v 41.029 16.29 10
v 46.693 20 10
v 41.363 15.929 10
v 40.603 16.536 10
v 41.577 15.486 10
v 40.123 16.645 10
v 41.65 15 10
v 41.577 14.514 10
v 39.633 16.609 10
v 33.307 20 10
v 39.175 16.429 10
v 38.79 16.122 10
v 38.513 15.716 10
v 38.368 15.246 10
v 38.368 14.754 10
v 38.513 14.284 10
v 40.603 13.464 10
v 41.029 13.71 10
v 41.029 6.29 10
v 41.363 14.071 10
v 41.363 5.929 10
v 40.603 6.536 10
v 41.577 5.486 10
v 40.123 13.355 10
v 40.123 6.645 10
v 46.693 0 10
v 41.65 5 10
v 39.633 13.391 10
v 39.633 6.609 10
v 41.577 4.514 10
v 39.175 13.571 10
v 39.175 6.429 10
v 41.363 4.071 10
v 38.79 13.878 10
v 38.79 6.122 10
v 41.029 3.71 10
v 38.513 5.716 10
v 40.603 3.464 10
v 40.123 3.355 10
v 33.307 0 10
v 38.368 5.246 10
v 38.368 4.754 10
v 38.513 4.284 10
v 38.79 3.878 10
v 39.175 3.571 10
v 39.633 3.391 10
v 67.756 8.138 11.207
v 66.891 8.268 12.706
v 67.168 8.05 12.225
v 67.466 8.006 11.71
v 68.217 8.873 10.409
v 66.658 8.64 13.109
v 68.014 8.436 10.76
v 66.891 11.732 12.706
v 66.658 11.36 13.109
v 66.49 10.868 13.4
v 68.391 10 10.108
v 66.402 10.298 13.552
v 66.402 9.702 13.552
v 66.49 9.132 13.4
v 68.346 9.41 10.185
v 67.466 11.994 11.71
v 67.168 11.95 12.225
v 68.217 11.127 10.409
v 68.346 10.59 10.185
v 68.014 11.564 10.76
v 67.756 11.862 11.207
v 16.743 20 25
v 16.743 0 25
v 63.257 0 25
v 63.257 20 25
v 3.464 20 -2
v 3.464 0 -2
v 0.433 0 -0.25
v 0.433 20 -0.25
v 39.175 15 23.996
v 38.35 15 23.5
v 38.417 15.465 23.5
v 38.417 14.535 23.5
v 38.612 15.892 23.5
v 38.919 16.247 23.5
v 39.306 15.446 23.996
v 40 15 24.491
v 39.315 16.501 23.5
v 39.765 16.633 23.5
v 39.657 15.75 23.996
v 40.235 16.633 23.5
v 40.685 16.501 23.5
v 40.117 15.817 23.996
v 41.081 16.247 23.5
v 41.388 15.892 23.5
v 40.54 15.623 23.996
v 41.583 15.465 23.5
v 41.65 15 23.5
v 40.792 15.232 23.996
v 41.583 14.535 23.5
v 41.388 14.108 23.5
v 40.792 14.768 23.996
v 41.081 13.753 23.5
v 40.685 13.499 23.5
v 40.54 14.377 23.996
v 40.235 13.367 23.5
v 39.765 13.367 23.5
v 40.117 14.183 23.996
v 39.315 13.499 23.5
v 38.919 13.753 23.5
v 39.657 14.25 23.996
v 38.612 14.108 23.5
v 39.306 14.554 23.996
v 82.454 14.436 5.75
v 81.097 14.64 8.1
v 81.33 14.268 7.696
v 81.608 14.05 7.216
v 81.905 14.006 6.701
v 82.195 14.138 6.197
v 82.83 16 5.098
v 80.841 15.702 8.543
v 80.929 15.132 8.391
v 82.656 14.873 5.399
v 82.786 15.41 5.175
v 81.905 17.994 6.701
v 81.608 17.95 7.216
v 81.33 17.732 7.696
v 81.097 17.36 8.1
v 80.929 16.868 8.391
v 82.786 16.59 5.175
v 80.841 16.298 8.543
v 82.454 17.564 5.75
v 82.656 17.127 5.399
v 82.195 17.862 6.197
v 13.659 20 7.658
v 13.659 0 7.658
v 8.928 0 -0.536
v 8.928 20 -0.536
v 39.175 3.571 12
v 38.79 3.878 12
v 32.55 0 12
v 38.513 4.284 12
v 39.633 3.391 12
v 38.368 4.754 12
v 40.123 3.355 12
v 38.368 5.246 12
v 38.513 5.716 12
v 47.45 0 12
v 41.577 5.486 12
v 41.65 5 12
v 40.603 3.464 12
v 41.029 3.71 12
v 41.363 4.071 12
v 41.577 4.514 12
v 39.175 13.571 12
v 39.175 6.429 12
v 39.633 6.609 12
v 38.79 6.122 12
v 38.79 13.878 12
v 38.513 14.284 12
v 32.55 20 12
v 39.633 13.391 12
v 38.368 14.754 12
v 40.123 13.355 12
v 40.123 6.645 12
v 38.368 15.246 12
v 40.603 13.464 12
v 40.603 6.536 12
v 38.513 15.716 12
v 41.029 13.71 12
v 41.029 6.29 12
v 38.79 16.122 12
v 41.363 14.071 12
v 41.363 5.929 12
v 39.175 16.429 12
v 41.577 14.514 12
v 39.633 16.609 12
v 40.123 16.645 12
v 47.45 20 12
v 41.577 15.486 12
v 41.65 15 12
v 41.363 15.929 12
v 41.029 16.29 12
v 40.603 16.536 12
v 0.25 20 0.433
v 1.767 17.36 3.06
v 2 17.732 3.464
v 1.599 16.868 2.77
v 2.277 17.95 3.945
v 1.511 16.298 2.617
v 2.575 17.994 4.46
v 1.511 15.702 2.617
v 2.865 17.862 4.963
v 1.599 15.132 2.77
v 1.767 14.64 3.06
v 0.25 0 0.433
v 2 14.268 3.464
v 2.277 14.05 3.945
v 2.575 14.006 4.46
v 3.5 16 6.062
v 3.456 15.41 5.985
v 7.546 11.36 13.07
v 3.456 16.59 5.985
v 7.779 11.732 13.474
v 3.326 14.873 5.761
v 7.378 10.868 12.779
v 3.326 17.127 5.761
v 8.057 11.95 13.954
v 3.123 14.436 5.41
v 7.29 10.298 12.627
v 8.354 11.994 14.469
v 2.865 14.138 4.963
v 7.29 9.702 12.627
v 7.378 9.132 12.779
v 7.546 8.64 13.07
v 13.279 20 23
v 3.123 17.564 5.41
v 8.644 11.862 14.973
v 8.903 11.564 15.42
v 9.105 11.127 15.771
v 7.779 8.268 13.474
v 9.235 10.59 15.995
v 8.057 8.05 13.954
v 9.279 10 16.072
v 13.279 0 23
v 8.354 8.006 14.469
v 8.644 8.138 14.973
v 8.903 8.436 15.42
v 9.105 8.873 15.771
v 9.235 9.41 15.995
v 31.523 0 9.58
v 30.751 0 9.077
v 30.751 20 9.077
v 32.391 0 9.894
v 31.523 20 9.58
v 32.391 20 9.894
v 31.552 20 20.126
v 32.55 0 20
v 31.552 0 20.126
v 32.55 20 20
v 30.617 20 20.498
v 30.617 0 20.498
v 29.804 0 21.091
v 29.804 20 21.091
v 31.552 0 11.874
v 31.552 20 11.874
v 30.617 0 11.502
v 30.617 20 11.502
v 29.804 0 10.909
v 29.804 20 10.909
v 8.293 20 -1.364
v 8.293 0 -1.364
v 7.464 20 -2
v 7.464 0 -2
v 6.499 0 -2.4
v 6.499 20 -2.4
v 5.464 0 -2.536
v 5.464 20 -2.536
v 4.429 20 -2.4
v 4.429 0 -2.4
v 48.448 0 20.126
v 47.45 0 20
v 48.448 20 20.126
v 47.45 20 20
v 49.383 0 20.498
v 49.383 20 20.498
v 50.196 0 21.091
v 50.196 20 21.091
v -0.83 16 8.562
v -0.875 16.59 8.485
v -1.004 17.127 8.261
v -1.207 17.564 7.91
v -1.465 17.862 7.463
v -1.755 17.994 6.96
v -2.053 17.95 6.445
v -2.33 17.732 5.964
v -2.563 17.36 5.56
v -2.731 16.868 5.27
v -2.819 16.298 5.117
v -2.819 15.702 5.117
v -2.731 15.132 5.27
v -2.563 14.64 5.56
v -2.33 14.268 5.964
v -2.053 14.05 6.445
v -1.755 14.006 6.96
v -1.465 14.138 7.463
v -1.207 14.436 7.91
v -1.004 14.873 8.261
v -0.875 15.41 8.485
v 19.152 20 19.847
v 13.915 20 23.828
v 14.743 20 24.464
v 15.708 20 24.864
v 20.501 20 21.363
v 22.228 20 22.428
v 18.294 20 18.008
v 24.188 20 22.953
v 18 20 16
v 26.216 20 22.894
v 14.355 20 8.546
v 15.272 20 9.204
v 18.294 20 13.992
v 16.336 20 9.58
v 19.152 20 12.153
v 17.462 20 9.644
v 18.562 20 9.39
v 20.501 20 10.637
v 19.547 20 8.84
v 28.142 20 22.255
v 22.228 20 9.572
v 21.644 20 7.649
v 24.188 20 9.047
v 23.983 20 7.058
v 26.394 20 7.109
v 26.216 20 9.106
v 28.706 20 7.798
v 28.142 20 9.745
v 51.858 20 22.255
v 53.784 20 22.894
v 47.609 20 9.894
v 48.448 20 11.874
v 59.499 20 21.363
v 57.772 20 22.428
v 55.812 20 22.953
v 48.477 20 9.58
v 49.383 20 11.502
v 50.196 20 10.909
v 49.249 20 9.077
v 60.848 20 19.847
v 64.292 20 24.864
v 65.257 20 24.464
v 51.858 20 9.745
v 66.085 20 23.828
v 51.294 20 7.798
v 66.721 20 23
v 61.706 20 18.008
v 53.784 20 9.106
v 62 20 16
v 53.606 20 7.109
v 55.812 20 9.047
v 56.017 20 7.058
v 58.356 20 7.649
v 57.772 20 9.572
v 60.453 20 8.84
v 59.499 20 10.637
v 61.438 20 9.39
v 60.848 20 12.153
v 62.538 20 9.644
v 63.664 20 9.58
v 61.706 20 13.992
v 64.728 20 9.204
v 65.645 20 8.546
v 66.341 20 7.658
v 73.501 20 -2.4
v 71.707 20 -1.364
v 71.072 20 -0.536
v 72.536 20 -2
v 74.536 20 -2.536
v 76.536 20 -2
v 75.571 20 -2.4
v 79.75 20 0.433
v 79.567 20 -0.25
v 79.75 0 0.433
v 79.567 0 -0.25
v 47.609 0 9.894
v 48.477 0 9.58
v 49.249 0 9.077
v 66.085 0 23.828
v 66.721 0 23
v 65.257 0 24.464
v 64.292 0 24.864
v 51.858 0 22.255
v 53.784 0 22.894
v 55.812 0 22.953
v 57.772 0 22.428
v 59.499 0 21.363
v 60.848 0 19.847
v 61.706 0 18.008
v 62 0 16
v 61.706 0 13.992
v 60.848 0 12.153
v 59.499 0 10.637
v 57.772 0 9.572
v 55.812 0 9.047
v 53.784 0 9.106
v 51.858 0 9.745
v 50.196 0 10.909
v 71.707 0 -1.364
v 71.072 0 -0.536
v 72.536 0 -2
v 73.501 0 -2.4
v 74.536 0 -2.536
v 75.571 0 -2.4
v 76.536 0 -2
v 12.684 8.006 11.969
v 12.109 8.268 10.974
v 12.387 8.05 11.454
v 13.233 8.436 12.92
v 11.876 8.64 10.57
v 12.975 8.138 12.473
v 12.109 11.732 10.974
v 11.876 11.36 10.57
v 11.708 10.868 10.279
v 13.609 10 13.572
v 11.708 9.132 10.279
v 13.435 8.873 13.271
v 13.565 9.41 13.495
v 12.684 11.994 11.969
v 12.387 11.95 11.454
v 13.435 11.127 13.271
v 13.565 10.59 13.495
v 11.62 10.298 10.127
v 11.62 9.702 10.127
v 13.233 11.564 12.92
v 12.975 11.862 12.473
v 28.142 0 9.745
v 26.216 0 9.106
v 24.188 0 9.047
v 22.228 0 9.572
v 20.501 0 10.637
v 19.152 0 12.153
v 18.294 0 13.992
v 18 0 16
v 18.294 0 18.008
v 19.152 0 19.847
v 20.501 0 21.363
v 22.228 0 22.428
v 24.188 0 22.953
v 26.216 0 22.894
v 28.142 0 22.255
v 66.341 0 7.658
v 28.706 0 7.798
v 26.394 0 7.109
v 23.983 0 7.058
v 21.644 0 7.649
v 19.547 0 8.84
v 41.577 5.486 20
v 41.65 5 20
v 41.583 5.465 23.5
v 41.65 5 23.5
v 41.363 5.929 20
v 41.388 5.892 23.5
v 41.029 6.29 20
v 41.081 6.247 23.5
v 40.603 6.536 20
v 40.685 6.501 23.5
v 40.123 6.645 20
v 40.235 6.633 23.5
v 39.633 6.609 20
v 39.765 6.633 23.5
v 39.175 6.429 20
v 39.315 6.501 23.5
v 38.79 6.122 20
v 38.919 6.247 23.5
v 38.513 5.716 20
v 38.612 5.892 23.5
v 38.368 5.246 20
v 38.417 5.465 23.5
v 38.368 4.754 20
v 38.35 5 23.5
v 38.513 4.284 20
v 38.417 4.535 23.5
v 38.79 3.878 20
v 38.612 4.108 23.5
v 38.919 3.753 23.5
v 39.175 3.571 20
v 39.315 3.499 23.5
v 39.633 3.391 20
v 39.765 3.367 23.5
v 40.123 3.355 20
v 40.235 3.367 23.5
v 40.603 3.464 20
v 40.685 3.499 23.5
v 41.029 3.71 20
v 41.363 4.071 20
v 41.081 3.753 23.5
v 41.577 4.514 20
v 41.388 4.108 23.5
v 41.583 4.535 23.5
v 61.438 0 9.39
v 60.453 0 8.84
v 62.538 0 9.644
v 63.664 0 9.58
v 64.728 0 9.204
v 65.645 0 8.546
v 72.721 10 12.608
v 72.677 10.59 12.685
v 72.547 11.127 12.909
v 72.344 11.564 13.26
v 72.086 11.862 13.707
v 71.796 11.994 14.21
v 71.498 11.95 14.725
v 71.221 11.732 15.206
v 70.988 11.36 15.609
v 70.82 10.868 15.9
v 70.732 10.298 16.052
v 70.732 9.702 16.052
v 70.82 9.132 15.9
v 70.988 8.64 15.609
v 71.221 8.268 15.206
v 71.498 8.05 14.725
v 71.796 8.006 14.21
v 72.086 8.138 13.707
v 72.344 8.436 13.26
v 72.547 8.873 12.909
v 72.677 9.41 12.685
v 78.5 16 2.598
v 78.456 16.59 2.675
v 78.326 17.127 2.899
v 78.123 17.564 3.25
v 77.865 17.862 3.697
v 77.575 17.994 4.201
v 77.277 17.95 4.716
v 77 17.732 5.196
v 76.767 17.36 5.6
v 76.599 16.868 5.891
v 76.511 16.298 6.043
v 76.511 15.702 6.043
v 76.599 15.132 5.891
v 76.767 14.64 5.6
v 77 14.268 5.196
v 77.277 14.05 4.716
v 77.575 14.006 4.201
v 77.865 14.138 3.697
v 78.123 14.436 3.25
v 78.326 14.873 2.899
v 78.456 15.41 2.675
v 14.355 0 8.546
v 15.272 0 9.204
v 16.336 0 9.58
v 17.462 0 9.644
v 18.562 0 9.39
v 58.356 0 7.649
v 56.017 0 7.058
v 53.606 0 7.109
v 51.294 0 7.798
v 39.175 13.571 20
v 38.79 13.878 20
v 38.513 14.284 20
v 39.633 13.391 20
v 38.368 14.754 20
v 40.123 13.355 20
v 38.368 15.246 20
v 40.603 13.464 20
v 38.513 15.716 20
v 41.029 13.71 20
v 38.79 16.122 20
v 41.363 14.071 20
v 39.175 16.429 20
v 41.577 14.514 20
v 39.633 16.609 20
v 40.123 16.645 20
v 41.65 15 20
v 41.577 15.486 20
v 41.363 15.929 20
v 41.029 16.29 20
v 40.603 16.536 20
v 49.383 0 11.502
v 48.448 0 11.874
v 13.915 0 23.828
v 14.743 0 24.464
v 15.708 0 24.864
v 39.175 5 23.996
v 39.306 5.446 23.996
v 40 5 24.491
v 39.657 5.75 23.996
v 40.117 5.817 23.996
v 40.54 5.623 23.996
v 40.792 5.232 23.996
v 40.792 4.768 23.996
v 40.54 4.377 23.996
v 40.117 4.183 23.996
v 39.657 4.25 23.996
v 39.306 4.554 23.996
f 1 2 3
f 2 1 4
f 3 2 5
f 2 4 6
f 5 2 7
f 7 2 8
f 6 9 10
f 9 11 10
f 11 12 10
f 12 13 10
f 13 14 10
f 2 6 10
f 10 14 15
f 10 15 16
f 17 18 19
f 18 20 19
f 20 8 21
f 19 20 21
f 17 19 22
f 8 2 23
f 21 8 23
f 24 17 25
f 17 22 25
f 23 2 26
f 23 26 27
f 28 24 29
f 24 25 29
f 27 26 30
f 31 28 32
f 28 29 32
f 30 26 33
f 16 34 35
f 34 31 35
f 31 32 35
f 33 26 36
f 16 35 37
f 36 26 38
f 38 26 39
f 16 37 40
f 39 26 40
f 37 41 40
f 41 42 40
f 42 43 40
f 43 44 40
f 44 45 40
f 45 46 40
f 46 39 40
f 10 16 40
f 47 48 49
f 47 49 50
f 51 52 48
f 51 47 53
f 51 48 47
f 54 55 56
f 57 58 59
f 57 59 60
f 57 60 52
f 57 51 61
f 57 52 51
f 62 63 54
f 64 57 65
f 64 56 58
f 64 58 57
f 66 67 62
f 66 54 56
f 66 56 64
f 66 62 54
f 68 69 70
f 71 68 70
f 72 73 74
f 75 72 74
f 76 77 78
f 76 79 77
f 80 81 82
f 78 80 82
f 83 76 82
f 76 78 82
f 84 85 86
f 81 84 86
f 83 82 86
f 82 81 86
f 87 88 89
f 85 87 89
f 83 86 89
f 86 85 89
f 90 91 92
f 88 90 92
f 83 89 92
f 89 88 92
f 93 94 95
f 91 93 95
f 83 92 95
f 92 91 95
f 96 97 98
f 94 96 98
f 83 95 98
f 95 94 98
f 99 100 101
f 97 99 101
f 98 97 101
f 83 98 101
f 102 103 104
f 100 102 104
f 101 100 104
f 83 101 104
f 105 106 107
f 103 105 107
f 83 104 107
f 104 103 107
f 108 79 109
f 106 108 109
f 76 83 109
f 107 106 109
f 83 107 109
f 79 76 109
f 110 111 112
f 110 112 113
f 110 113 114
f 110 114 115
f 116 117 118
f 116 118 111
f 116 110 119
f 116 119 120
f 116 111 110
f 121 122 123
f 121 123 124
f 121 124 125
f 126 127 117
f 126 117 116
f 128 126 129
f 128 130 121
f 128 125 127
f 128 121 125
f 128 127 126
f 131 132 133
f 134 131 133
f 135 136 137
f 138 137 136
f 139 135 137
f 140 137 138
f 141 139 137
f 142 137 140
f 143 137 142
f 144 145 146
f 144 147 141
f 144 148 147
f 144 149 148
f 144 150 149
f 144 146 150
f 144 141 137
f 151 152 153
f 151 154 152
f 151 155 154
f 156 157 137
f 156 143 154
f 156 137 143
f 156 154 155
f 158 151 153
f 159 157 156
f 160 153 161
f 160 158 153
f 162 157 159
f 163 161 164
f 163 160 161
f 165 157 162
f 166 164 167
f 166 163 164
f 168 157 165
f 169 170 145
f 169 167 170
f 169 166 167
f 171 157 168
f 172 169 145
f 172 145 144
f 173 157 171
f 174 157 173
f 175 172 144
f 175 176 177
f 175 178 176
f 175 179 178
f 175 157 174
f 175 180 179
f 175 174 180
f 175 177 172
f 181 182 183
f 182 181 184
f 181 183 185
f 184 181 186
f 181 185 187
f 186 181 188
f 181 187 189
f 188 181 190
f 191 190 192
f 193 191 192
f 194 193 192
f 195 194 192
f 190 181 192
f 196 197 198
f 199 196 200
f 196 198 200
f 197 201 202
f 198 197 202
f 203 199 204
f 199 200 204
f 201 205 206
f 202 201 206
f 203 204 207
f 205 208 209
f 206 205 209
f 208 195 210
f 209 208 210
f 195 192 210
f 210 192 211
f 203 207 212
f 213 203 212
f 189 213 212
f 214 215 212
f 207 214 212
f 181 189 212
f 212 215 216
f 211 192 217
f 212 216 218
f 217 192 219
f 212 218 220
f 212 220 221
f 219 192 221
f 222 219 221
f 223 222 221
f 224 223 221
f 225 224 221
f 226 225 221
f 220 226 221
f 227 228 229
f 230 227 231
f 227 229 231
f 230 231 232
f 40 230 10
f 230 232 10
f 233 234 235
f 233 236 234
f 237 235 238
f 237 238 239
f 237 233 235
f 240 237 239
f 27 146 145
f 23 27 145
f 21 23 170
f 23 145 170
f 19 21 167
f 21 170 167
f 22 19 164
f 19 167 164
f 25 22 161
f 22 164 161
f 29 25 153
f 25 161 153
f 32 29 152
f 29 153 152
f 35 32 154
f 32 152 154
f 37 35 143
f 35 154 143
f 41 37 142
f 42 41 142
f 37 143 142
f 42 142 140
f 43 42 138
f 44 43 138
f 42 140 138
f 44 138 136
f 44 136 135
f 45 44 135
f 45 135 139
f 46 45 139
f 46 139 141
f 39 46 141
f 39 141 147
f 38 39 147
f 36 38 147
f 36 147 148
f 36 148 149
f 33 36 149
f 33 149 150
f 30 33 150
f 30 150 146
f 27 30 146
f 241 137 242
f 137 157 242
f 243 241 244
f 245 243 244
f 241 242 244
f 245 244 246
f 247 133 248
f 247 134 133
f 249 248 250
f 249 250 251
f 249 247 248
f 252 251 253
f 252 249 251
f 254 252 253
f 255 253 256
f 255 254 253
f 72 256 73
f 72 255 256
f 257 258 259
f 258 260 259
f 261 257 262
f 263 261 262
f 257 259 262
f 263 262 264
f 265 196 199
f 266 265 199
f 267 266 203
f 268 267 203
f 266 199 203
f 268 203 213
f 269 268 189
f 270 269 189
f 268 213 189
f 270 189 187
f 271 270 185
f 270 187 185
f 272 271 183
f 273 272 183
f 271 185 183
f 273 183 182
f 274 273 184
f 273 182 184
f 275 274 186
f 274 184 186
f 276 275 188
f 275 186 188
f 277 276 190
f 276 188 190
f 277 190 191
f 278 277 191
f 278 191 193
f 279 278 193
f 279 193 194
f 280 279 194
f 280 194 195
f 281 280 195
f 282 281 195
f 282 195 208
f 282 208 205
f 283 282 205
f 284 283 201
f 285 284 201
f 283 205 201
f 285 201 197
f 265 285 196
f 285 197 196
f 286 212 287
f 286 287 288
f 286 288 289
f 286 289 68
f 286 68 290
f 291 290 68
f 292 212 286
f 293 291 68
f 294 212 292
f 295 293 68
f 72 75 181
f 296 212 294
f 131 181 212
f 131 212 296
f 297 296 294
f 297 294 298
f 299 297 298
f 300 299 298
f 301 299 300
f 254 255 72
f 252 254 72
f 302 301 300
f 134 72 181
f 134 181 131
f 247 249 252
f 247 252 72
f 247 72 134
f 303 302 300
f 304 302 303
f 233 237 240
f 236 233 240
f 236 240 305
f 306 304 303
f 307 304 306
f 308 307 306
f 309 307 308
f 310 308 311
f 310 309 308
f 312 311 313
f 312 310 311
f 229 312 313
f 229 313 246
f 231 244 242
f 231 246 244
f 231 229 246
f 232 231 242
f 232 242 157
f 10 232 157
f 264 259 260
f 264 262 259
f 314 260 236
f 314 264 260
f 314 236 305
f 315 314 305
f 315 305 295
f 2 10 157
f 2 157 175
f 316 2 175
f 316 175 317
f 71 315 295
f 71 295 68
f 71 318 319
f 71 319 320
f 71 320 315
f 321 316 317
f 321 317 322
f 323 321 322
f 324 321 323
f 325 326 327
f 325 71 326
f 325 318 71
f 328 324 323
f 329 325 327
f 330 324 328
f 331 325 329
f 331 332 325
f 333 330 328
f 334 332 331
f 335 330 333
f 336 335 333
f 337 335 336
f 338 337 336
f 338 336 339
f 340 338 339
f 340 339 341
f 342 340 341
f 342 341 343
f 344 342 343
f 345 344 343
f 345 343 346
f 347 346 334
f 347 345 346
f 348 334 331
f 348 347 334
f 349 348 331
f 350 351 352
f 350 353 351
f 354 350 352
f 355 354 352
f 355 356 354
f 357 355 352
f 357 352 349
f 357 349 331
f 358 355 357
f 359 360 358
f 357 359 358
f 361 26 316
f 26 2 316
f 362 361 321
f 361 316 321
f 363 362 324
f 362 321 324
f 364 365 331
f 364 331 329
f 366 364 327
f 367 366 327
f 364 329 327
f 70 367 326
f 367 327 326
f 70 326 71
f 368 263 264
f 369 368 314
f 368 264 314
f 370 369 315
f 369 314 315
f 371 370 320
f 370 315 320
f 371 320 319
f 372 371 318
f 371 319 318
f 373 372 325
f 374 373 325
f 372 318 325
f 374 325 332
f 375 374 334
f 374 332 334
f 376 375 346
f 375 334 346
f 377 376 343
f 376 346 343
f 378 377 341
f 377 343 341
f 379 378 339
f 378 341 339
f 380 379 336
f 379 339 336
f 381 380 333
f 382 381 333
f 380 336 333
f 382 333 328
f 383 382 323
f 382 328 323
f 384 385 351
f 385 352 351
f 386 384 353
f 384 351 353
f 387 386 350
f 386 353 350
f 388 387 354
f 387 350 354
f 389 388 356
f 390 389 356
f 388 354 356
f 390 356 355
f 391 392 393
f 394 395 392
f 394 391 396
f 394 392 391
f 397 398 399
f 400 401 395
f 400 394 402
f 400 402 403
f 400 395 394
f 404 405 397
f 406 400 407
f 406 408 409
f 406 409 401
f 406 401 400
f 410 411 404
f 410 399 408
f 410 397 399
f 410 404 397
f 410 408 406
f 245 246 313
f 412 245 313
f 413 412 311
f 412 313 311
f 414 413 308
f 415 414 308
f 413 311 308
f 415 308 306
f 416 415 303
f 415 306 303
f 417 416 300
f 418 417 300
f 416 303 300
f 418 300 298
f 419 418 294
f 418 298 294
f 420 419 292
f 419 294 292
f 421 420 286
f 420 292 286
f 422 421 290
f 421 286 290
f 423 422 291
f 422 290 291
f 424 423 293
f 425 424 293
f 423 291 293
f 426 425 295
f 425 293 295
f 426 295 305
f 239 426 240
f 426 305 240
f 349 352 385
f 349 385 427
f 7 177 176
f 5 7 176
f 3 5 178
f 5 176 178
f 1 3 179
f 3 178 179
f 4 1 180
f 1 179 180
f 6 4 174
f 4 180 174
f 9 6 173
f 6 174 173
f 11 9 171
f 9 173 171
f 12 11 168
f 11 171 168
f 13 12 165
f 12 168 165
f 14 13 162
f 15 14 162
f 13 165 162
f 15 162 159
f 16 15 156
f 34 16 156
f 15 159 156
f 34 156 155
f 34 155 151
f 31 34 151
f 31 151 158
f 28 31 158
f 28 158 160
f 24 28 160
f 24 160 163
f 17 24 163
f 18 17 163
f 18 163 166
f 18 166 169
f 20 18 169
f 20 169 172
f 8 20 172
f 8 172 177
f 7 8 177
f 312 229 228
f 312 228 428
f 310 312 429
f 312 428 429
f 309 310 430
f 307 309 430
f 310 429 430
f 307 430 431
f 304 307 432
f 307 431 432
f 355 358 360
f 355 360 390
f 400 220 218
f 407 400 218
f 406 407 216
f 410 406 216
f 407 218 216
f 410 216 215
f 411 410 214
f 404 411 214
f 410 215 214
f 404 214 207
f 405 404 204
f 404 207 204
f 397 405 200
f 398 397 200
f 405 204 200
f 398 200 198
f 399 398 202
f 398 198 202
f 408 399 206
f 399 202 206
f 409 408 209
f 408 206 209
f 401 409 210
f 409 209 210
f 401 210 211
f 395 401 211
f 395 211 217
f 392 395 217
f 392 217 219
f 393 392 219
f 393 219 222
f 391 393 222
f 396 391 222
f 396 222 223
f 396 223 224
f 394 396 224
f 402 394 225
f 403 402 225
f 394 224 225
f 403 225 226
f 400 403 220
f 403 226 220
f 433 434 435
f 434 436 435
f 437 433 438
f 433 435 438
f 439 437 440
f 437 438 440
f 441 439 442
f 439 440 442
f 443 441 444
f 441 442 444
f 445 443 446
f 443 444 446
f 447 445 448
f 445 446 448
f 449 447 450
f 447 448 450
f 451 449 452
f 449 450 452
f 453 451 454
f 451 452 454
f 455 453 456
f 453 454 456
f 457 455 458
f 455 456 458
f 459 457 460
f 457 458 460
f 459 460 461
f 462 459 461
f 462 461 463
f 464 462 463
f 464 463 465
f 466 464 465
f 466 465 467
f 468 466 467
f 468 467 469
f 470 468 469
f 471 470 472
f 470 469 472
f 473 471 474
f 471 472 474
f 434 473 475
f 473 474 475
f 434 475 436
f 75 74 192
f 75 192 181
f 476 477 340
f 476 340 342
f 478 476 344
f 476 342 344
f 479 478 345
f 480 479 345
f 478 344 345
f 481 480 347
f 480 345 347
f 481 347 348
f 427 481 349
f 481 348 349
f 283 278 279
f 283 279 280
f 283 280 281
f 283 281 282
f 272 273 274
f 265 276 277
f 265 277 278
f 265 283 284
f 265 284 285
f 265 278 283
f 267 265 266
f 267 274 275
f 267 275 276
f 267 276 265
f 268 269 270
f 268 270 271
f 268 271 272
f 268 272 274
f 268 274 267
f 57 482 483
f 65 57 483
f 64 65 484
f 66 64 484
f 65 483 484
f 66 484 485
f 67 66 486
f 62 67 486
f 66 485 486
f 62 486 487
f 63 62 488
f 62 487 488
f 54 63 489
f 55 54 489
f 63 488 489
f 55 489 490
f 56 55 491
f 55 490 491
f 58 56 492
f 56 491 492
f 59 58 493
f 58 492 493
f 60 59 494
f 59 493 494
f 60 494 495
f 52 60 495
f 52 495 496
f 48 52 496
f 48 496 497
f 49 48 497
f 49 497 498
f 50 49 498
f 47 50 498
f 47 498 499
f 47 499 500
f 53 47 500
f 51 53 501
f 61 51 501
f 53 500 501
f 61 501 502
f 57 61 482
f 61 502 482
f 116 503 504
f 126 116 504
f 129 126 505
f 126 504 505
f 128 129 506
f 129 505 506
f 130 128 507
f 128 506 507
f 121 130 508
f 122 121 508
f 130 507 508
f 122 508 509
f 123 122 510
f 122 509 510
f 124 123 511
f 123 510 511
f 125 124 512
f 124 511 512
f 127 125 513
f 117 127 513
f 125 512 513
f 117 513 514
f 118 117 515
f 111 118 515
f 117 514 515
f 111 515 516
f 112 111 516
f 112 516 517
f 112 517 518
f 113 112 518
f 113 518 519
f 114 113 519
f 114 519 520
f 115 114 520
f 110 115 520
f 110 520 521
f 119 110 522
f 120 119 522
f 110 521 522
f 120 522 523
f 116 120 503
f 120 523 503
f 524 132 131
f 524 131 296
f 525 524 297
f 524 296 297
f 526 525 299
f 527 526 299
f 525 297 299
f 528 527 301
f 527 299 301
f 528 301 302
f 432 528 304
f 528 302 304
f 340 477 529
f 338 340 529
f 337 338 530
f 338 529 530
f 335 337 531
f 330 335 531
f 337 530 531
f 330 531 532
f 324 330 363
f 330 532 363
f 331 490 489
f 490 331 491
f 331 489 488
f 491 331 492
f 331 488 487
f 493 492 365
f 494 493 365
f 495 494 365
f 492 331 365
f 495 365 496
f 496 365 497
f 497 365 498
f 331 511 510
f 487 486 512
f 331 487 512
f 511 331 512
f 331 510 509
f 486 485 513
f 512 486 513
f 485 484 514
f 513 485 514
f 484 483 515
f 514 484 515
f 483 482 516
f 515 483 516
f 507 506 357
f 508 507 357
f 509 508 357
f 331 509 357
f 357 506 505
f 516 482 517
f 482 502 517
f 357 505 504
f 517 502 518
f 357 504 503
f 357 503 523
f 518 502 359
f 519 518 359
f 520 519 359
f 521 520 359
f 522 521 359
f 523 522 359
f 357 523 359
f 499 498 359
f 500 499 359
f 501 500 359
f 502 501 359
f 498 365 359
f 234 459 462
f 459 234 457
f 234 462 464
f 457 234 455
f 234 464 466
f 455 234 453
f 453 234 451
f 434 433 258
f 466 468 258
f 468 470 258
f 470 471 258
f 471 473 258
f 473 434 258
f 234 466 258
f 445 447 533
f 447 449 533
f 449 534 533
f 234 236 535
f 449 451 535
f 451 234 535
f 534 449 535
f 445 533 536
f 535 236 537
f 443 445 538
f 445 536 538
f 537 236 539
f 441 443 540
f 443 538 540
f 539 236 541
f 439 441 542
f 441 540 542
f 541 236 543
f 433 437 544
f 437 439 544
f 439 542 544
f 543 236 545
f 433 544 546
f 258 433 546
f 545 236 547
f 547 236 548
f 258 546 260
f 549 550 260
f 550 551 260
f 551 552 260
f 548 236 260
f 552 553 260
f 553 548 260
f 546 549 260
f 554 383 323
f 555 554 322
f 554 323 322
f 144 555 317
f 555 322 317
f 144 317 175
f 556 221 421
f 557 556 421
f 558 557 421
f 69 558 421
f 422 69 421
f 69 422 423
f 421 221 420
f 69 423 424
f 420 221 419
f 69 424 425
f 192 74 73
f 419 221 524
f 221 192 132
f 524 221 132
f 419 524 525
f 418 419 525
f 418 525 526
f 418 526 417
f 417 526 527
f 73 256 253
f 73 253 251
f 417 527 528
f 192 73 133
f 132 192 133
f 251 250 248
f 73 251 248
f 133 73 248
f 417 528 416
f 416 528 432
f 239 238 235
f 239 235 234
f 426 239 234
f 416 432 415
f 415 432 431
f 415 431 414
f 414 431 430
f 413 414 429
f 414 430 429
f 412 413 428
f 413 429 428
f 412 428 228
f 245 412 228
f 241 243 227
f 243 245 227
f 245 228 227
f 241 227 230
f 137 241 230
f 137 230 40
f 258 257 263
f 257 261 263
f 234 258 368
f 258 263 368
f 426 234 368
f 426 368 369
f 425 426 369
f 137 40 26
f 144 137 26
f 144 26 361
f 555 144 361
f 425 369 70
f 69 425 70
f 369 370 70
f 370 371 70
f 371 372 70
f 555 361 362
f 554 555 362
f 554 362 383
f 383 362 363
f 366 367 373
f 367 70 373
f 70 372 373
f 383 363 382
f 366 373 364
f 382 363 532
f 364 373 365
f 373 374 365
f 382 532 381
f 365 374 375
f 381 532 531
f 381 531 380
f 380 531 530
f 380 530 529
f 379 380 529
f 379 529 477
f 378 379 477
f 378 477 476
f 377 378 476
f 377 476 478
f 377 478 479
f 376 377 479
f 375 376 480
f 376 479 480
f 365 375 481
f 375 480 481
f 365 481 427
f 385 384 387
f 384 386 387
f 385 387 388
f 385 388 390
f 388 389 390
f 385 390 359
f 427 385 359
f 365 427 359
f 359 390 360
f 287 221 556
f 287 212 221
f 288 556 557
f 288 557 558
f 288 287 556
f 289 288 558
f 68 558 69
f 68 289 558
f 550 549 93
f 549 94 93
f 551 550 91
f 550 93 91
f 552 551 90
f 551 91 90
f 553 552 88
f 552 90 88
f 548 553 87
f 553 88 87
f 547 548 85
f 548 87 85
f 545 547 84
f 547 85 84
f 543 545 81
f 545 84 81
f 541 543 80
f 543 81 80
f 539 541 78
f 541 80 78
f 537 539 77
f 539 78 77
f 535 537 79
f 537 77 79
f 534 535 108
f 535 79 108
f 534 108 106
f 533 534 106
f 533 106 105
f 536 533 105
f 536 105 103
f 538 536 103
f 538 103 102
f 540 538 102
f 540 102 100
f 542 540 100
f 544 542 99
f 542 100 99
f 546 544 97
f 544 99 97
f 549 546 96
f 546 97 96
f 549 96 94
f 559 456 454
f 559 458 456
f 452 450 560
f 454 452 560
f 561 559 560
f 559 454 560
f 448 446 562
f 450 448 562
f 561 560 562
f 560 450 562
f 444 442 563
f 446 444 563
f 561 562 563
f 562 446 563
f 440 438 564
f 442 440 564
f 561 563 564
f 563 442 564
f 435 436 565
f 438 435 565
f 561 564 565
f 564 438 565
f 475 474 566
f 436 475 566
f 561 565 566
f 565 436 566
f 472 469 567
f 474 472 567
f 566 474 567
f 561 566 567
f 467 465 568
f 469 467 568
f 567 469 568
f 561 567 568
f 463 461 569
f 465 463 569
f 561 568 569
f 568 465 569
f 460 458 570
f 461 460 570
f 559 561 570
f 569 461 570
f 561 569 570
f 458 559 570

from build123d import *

# Parameters (mm, degrees)
EXTRUDE_1_DEPTH     = 20
SKETCH_2_R          = 7
CUT_EXTRUDE_1_DEPTH = 21
SKETCH_3_W          = 30
SKETCH_3_H          = 8
CUT_EXTRUDE_2_DEPTH = 21
FILLET_1_R          = 4
CHAMFER_1_SIZE      = 0.5
M4X0_71_D           = 3.3
M4X0_71_DEPTH       = 13.5
M4X0_71_TIP         = 0.991420021
SKETCH_6_R          = 2
CUT_EXTRUDE_3_DEPTH = 5
SKETCH_7_R          = 2
CUT_EXTRUDE_4_DEPTH = 5
SKETCH_8_R          = 2
EXTRUDE_2_DEPTH     = 5
SKETCH_9_R          = 2
EXTRUDE_3_DEPTH     = 5


with BuildPart() as part:
    # Эскиз1 → Бобышка-Вытянуть1 (new body)
    with BuildSketch(Plane(origin=(0, 0, 0), x_dir=(1, 0, 0), z_dir=(0, 1, 0))):
        with BuildLine():
            Line((0, 0), (14.43375673, -25))
            Line((14.43375673, -25), (65.56624327, -25))
            Line((65.56624327, -25), (80, 0))
            Line((80, 0), (73.07179677, 4))
            Line((73.07179677, 4), (63.396104176, -12.758791171))
            ThreePointArc((63.396104176, -12.758791171), (56.617091212, -7.146468727), (48.291796068, -10))
            Line((48.291796068, -10), (31.708203932, -10))
            ThreePointArc((31.708203932, -10), (23.382908788, -7.146468727), (16.603895824, -12.758791171))
            Line((16.603895824, -12.758791171), (6.92820323, 4))
            Line((6.92820323, 4), (0, 0))
        make_face()
    extrude(amount=EXTRUDE_1_DEPTH)

    # Эскиз2 → Вырез-Вытянуть1 (cut, through all)
    with BuildSketch(Plane(origin=(0, 20, 0), x_dir=(1, 0, 0), z_dir=(0, 1, 0))):
        with Locations((25, -16)):
            Circle(SKETCH_2_R)
        with Locations((55, -16)):
            Circle(SKETCH_2_R)
    extrude(amount=-CUT_EXTRUDE_1_DEPTH, mode=Mode.SUBTRACT)

    # Эскиз3 → Вырез-Вытянуть2 (cut, through all)
    with BuildSketch(Plane(origin=(0, 20, 0), x_dir=(1, 0, 0), z_dir=(0, 1, 0))):
        with Locations((40, -16)):
            Rectangle(SKETCH_3_W, SKETCH_3_H)
    extrude(amount=-CUT_EXTRUDE_2_DEPTH, mode=Mode.SUBTRACT)

    # Скругление1
    fillet_1_edges = [part.edges().sort_by_distance(p)[0] for p in [
        (6.92820323, 10, -4),
        (16.603895824, 10, 12.758791171),
        (31.708203932, 10, 10),
        (48.291796068, 10, 10),
        (63.396104176, 10, 12.758791171),
        (73.07179677, 10, -4),
        (65.56624327, 10, 25),
        (14.43375673, 10, 25),
        (49.255437353, 10, 12),
        (49.255437353, 10, 20),
        (30.744562647, 10, 20),
        (30.744562647, 10, 12),
    ]]
    fillet(fillet_1_edges, radius=FILLET_1_R)

    # Фаска1
    chamfer_1_edges = [part.edges().sort_by_distance(p)[0] for p in [
        (80, 10, 0),
        (0, 10, 0),
    ]]
    chamfer(chamfer_1_edges, length=CHAMFER_1_SIZE)

    # Отверстие обработанное метчиком M4x0.71
    with Locations(Plane(origin=(40, 5, 10), x_dir=(-1, 0, 0), z_dir=(0, 0, -1))):
        with Locations((0, 0), (0, 10)):
            Hole(M4X0_71_D / 2, depth=M4X0_71_DEPTH)
            with Locations((0, 0, -(M4X0_71_DEPTH + M4X0_71_TIP / 2))):  # 118° drill point
                Cone(0, M4X0_71_D / 2, M4X0_71_TIP, mode=Mode.SUBTRACT)

    # Эскиз6 → Вырез-Вытянуть3 (cut)
    with BuildSketch(Plane(origin=(60, 0, 34.641016151), x_dir=(0.5, 0, -0.866025404), z_dir=(0.866025404, 0, 0.5))):
        with Locations((23.441887617, 10)):
            Circle(SKETCH_6_R)
    extrude(amount=-CUT_EXTRUDE_3_DEPTH, mode=Mode.SUBTRACT)

    # Эскиз7 → Вырез-Вытянуть4 (cut)
    with BuildSketch(Plane(origin=(0, 0, 0), x_dir=(0.5, 0, 0.866025404), z_dir=(-0.866025404, 0, 0.5))):
        with Locations((16.558112383, 10)):
            Circle(SKETCH_7_R)
    extrude(amount=-CUT_EXTRUDE_4_DEPTH, mode=Mode.SUBTRACT)

    # Эскиз8 → Бобышка-Вытянуть2 (add)
    with BuildSketch(Plane(origin=(0, 0, 0), x_dir=(0.5, 0, 0.866025404), z_dir=(-0.866025404, 0, 0.5))):
        with Locations((5, 16)):
            Circle(SKETCH_8_R)
    extrude(amount=EXTRUDE_2_DEPTH)

    # Эскиз9 → Бобышка-Вытянуть3 (add)
    with BuildSketch(Plane(origin=(60, 0, 34.641016151), x_dir=(0.5, 0, -0.866025404), z_dir=(0.866025404, 0, 0.5))):
        with Locations((35, 16)):
            Circle(SKETCH_9_R)
    extrude(amount=EXTRUDE_3_DEPTH)


solid = part.part
